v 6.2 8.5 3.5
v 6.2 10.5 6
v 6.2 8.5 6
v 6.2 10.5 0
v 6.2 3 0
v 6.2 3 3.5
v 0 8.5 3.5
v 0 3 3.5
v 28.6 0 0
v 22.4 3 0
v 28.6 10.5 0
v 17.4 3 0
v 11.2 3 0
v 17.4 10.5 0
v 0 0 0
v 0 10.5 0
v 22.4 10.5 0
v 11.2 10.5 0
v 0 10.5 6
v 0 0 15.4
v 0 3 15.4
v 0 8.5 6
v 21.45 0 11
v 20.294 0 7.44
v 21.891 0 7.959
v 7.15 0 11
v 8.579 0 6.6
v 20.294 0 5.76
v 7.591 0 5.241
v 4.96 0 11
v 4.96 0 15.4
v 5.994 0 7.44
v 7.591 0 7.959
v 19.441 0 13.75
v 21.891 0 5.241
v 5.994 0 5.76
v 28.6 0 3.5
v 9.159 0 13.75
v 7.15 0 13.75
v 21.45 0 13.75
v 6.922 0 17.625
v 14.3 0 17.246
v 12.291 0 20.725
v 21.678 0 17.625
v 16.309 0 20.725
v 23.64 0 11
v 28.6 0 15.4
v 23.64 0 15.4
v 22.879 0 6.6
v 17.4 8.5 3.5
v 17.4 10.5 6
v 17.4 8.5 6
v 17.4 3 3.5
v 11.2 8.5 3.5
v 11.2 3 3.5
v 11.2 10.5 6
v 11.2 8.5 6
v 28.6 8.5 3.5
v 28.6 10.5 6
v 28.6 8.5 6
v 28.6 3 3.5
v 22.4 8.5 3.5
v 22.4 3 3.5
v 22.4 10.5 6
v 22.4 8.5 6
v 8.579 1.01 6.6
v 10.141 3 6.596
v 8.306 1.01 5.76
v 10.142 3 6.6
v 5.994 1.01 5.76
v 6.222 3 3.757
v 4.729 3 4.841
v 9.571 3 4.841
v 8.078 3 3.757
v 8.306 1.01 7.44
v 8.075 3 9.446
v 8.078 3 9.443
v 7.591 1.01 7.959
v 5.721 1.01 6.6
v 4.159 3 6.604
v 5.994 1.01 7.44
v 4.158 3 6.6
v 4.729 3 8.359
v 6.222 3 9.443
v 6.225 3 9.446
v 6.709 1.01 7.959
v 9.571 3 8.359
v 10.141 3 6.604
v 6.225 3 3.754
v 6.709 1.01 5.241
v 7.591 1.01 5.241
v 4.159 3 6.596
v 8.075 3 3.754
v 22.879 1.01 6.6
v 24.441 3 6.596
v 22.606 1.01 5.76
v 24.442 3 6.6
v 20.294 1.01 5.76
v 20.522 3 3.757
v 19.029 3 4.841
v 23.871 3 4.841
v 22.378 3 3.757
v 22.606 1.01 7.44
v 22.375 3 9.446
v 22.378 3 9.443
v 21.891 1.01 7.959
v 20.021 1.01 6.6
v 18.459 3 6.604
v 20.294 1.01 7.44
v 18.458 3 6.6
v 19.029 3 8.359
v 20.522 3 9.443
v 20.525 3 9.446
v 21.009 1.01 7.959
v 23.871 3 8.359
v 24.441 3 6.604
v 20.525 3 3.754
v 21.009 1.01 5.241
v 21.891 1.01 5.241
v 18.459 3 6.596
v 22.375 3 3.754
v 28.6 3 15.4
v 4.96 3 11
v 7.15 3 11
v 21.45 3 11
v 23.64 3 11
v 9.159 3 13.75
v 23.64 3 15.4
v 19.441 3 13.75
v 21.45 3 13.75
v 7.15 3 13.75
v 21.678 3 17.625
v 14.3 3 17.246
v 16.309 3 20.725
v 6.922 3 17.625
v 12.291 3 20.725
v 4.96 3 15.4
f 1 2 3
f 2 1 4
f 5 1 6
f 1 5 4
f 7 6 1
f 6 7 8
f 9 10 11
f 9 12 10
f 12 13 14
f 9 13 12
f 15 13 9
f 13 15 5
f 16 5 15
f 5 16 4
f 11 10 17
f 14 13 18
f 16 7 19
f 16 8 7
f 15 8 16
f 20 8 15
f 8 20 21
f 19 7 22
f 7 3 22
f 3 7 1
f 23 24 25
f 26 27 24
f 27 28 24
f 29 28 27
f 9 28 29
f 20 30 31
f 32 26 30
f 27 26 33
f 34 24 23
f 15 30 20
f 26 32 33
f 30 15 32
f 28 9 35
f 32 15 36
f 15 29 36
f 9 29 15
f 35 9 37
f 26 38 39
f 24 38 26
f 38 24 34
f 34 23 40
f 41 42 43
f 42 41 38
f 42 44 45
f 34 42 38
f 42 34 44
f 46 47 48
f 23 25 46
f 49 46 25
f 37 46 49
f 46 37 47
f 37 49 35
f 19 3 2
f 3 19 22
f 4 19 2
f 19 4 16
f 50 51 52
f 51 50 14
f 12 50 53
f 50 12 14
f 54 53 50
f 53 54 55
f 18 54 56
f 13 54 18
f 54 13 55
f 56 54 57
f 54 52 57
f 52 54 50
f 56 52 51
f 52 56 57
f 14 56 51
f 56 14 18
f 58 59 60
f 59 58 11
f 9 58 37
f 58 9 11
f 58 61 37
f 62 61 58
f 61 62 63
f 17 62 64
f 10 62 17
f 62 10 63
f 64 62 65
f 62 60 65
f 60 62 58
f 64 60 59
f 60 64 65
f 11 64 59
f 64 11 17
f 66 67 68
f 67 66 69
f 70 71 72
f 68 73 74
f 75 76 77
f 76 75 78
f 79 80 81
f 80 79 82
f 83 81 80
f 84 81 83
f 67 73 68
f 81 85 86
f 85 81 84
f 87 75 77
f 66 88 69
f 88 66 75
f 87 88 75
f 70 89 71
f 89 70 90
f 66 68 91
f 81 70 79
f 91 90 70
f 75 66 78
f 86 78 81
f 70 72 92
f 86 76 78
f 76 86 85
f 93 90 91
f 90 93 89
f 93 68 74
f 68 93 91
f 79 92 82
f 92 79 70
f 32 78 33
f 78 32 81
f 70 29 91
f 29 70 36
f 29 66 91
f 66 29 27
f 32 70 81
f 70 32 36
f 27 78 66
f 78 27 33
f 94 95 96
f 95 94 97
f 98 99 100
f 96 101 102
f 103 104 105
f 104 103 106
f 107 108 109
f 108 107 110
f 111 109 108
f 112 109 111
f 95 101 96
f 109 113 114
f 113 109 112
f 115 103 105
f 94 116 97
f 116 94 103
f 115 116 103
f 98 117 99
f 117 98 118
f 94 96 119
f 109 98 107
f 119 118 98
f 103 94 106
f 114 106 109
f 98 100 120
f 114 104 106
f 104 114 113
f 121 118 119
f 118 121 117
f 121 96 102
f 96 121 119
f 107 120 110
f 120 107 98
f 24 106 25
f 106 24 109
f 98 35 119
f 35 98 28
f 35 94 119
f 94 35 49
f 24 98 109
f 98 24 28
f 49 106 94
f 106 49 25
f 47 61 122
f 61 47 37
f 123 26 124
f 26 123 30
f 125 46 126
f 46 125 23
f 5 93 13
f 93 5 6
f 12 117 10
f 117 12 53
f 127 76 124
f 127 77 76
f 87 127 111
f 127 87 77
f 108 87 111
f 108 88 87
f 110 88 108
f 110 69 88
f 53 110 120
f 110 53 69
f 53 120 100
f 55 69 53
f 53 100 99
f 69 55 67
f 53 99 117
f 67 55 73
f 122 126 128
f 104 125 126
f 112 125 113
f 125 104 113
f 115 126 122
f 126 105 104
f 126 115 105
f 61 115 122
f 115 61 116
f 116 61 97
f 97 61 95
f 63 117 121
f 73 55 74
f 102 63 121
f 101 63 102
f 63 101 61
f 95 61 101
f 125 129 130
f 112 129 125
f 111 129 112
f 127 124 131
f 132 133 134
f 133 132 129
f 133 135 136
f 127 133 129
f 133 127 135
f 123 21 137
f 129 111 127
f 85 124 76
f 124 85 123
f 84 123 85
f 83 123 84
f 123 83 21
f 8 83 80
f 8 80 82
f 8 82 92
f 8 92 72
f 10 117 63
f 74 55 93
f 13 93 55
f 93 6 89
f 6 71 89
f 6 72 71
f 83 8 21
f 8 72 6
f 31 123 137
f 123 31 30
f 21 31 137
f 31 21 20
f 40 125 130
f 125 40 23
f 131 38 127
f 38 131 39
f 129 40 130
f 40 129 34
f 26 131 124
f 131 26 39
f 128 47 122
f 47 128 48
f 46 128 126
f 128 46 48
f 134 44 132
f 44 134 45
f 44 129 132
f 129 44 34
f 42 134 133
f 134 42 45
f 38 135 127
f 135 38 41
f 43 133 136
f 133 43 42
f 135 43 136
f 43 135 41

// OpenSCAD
//one more cabel holder
cabel_x = 5;
support_x = 6.2;
support_z = 3.5;
screw_r1 = 3/2.1;
screw_r2 = 6/2;
screw_h = 2;
cabel_y = 8.5;
n_cabels = 2;
lip_y = 2;
lip_z = 6;
mount_y = 3;
mount_z = 11;
// derived parameters
total_x =  (support_x + cabel_x) * n_cabels + support_x;


module support(){
  // main support
  cube([support_x, cabel_y, support_z]);
  // lip
  translate([0,cabel_y,0]) cube([support_x, lip_y, lip_z]);
}

module screwhead(){
  translate([0,0,mount_y - screw_h + 1]) cylinder(r1=screw_r1, r2=screw_r2, h=screw_h );
  cylinder(r=screw_r1, h=mount_y+1);
}

module decorum(){
  translate([0,0,mount_z]){
    // side block right
    cube([support_x*0.8,mount_y,mount_z/2.5]);
    translate([total_x/4,0,0]) cube([total_x/2,mount_y,mount_z/4]);
    // side block left
    translate([total_x - support_x * 0.8,0,0]) cube([support_x * 0.8,mount_y,mount_z/2.5]);
    translate([total_x*3/5,mount_y/2,mount_z/2.2]){ 
      rotate([0,30,0]) cube([support_x,mount_y,mount_z/1.5], center=true);
	 }
    translate([total_x*2/5,mount_y/2,mount_z/2.2]){
      rotate([0,-30,0]) cube([support_x,mount_y,mount_z/1.5],center=true);
    }
  }
}


// main
for(i=[0:n_cabels]){
  translate([i * (support_x + cabel_x),0,0]) support();
}
difference(){
  cube([total_x, mount_y, mount_z]);
  for(i=[1:2:3]){
  translate([total_x/4 * i,-0.99,mount_z * 3/5]){
    rotate([-90,0,0]) screwhead();
    }
  }
}
//decorum
translate([0,0,0]) decorum();
//screwhead()
